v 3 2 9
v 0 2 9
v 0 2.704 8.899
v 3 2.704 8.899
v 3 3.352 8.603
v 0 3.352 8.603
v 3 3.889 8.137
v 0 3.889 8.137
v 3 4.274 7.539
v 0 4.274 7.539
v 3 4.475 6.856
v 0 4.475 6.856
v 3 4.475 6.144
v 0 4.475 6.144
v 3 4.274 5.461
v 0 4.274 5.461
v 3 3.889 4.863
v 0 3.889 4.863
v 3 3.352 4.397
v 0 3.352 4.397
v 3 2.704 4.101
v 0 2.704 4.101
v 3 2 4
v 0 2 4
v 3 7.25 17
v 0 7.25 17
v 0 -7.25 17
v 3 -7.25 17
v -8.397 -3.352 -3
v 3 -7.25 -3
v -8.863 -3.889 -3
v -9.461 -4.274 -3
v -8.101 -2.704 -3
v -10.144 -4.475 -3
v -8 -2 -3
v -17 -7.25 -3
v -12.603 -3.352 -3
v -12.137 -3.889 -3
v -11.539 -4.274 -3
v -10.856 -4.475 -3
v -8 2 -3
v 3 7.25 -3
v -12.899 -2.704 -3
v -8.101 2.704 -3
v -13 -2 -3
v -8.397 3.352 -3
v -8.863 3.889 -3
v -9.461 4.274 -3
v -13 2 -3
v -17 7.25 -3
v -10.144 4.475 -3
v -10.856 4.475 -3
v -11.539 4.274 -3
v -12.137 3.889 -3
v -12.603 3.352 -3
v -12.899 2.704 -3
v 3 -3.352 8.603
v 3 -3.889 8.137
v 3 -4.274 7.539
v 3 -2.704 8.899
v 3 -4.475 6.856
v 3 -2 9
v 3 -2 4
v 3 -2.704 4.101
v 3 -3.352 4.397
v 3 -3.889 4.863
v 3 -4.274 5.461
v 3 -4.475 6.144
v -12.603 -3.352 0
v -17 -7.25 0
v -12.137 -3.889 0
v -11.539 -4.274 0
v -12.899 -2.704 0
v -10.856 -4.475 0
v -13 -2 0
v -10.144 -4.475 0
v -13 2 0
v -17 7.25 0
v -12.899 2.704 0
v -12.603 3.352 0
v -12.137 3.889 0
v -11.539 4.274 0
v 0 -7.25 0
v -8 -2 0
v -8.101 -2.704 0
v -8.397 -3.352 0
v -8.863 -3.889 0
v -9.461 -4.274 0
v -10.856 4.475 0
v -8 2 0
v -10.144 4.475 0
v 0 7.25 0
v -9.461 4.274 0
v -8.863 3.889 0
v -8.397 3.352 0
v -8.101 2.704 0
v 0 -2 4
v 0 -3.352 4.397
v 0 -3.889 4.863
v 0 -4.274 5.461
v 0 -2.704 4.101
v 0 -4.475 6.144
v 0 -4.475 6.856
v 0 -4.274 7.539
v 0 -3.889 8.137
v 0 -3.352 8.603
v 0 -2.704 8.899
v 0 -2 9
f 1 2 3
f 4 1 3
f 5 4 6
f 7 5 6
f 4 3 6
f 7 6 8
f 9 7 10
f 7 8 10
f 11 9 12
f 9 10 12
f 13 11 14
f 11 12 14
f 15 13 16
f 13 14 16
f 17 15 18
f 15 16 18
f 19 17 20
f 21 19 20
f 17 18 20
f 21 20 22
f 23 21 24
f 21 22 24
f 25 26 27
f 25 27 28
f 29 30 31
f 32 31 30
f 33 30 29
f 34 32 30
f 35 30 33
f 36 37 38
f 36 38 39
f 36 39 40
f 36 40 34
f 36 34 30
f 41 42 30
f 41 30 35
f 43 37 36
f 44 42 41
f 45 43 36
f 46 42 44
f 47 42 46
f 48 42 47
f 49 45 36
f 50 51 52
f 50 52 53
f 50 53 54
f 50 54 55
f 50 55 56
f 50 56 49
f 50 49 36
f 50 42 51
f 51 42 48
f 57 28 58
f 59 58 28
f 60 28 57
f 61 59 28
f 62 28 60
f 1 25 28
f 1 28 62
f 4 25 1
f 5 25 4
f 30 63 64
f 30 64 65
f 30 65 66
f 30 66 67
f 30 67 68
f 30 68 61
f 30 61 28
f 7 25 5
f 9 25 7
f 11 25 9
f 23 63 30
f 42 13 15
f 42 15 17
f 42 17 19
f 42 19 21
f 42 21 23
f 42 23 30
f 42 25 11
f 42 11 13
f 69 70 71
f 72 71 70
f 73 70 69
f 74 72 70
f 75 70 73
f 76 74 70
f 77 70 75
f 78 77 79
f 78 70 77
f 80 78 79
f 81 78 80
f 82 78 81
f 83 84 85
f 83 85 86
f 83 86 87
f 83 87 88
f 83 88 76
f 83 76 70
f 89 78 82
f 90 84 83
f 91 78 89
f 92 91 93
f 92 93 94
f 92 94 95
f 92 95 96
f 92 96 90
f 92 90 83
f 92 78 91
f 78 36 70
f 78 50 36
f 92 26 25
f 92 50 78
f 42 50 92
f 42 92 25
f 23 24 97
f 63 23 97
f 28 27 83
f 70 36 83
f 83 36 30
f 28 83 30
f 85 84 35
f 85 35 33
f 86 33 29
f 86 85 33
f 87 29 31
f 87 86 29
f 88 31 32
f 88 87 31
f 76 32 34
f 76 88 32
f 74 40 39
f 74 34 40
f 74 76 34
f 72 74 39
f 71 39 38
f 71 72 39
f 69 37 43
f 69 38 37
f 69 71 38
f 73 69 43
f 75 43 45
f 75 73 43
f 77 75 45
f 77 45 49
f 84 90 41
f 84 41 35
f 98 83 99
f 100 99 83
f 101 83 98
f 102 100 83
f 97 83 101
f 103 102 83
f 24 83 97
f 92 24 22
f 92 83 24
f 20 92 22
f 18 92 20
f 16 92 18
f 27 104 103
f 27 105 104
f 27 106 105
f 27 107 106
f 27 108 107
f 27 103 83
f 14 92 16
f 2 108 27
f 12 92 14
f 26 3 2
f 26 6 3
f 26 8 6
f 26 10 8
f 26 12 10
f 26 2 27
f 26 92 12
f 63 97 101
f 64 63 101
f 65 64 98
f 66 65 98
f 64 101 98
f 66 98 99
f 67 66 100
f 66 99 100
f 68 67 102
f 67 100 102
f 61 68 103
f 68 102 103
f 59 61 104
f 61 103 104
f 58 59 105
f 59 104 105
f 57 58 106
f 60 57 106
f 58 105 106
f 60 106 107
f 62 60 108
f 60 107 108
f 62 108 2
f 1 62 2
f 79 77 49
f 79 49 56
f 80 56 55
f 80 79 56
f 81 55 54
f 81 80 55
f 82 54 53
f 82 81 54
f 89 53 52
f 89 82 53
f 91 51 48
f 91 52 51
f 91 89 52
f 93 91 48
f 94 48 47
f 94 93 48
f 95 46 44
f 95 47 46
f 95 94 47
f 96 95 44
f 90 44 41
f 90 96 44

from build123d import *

# Parameters (mm, degrees)
BOSS_EXTRUDE1_DEPTH     = 7.25
CUT_EXTRUDE1_DEPTH      = 18
CUT_EXTRUDE1_DEPTH_BACK = 4
CUT_EXTRUDE2_DEPTH      = 4
CUT_EXTRUDE2_DEPTH_BACK = 18


with BuildPart() as part:
    # Sketch1 → Boss-Extrude1 (new body, symmetric)
    with BuildSketch(Plane(origin=(0, 0, 0), x_dir=(1, 0, 0), z_dir=(0, 1, 0))):
        Polygon((0, 0), (0, -17), (3, -17), (3, 3), (-17, 3), (-17, 0), align=None)
    extrude(amount=BOSS_EXTRUDE1_DEPTH, both=True)

    # Sketch2 → Cut-Extrude1 (cut, two sides)
    with BuildSketch(Plane.XY) as cut_extrude1_sk:
        with BuildLine():
            Line((-8, 2), (-8, -2))
            ThreePointArc((-8, -2), (-10.5, -4.5), (-13, -2))
            Line((-13, -2), (-13, 2))
            ThreePointArc((-13, 2), (-10.5, 4.5), (-8, 2))
        make_face()
    extrude(amount=CUT_EXTRUDE1_DEPTH, mode=Mode.SUBTRACT)
    extrude(cut_extrude1_sk.sketch, amount=-CUT_EXTRUDE1_DEPTH_BACK, mode=Mode.SUBTRACT)

    # Sketch3 → Cut-Extrude2 (cut, two sides)
    with BuildSketch(Plane(origin=(0, 0, 0), x_dir=(0, 0, -1), z_dir=(1, 0, 0))) as cut_extrude2_sk:
        with BuildLine():
            Line((-4, 2), (-4, -2))
            ThreePointArc((-4, -2), (-6.5, -4.5), (-9, -2))
            Line((-9, -2), (-9, 2))
            ThreePointArc((-9, 2), (-6.5, 4.5), (-4, 2))
        make_face()
    extrude(amount=CUT_EXTRUDE2_DEPTH, mode=Mode.SUBTRACT)
    extrude(cut_extrude2_sk.sketch, amount=-CUT_EXTRUDE2_DEPTH_BACK, mode=Mode.SUBTRACT)


solid = part.part
